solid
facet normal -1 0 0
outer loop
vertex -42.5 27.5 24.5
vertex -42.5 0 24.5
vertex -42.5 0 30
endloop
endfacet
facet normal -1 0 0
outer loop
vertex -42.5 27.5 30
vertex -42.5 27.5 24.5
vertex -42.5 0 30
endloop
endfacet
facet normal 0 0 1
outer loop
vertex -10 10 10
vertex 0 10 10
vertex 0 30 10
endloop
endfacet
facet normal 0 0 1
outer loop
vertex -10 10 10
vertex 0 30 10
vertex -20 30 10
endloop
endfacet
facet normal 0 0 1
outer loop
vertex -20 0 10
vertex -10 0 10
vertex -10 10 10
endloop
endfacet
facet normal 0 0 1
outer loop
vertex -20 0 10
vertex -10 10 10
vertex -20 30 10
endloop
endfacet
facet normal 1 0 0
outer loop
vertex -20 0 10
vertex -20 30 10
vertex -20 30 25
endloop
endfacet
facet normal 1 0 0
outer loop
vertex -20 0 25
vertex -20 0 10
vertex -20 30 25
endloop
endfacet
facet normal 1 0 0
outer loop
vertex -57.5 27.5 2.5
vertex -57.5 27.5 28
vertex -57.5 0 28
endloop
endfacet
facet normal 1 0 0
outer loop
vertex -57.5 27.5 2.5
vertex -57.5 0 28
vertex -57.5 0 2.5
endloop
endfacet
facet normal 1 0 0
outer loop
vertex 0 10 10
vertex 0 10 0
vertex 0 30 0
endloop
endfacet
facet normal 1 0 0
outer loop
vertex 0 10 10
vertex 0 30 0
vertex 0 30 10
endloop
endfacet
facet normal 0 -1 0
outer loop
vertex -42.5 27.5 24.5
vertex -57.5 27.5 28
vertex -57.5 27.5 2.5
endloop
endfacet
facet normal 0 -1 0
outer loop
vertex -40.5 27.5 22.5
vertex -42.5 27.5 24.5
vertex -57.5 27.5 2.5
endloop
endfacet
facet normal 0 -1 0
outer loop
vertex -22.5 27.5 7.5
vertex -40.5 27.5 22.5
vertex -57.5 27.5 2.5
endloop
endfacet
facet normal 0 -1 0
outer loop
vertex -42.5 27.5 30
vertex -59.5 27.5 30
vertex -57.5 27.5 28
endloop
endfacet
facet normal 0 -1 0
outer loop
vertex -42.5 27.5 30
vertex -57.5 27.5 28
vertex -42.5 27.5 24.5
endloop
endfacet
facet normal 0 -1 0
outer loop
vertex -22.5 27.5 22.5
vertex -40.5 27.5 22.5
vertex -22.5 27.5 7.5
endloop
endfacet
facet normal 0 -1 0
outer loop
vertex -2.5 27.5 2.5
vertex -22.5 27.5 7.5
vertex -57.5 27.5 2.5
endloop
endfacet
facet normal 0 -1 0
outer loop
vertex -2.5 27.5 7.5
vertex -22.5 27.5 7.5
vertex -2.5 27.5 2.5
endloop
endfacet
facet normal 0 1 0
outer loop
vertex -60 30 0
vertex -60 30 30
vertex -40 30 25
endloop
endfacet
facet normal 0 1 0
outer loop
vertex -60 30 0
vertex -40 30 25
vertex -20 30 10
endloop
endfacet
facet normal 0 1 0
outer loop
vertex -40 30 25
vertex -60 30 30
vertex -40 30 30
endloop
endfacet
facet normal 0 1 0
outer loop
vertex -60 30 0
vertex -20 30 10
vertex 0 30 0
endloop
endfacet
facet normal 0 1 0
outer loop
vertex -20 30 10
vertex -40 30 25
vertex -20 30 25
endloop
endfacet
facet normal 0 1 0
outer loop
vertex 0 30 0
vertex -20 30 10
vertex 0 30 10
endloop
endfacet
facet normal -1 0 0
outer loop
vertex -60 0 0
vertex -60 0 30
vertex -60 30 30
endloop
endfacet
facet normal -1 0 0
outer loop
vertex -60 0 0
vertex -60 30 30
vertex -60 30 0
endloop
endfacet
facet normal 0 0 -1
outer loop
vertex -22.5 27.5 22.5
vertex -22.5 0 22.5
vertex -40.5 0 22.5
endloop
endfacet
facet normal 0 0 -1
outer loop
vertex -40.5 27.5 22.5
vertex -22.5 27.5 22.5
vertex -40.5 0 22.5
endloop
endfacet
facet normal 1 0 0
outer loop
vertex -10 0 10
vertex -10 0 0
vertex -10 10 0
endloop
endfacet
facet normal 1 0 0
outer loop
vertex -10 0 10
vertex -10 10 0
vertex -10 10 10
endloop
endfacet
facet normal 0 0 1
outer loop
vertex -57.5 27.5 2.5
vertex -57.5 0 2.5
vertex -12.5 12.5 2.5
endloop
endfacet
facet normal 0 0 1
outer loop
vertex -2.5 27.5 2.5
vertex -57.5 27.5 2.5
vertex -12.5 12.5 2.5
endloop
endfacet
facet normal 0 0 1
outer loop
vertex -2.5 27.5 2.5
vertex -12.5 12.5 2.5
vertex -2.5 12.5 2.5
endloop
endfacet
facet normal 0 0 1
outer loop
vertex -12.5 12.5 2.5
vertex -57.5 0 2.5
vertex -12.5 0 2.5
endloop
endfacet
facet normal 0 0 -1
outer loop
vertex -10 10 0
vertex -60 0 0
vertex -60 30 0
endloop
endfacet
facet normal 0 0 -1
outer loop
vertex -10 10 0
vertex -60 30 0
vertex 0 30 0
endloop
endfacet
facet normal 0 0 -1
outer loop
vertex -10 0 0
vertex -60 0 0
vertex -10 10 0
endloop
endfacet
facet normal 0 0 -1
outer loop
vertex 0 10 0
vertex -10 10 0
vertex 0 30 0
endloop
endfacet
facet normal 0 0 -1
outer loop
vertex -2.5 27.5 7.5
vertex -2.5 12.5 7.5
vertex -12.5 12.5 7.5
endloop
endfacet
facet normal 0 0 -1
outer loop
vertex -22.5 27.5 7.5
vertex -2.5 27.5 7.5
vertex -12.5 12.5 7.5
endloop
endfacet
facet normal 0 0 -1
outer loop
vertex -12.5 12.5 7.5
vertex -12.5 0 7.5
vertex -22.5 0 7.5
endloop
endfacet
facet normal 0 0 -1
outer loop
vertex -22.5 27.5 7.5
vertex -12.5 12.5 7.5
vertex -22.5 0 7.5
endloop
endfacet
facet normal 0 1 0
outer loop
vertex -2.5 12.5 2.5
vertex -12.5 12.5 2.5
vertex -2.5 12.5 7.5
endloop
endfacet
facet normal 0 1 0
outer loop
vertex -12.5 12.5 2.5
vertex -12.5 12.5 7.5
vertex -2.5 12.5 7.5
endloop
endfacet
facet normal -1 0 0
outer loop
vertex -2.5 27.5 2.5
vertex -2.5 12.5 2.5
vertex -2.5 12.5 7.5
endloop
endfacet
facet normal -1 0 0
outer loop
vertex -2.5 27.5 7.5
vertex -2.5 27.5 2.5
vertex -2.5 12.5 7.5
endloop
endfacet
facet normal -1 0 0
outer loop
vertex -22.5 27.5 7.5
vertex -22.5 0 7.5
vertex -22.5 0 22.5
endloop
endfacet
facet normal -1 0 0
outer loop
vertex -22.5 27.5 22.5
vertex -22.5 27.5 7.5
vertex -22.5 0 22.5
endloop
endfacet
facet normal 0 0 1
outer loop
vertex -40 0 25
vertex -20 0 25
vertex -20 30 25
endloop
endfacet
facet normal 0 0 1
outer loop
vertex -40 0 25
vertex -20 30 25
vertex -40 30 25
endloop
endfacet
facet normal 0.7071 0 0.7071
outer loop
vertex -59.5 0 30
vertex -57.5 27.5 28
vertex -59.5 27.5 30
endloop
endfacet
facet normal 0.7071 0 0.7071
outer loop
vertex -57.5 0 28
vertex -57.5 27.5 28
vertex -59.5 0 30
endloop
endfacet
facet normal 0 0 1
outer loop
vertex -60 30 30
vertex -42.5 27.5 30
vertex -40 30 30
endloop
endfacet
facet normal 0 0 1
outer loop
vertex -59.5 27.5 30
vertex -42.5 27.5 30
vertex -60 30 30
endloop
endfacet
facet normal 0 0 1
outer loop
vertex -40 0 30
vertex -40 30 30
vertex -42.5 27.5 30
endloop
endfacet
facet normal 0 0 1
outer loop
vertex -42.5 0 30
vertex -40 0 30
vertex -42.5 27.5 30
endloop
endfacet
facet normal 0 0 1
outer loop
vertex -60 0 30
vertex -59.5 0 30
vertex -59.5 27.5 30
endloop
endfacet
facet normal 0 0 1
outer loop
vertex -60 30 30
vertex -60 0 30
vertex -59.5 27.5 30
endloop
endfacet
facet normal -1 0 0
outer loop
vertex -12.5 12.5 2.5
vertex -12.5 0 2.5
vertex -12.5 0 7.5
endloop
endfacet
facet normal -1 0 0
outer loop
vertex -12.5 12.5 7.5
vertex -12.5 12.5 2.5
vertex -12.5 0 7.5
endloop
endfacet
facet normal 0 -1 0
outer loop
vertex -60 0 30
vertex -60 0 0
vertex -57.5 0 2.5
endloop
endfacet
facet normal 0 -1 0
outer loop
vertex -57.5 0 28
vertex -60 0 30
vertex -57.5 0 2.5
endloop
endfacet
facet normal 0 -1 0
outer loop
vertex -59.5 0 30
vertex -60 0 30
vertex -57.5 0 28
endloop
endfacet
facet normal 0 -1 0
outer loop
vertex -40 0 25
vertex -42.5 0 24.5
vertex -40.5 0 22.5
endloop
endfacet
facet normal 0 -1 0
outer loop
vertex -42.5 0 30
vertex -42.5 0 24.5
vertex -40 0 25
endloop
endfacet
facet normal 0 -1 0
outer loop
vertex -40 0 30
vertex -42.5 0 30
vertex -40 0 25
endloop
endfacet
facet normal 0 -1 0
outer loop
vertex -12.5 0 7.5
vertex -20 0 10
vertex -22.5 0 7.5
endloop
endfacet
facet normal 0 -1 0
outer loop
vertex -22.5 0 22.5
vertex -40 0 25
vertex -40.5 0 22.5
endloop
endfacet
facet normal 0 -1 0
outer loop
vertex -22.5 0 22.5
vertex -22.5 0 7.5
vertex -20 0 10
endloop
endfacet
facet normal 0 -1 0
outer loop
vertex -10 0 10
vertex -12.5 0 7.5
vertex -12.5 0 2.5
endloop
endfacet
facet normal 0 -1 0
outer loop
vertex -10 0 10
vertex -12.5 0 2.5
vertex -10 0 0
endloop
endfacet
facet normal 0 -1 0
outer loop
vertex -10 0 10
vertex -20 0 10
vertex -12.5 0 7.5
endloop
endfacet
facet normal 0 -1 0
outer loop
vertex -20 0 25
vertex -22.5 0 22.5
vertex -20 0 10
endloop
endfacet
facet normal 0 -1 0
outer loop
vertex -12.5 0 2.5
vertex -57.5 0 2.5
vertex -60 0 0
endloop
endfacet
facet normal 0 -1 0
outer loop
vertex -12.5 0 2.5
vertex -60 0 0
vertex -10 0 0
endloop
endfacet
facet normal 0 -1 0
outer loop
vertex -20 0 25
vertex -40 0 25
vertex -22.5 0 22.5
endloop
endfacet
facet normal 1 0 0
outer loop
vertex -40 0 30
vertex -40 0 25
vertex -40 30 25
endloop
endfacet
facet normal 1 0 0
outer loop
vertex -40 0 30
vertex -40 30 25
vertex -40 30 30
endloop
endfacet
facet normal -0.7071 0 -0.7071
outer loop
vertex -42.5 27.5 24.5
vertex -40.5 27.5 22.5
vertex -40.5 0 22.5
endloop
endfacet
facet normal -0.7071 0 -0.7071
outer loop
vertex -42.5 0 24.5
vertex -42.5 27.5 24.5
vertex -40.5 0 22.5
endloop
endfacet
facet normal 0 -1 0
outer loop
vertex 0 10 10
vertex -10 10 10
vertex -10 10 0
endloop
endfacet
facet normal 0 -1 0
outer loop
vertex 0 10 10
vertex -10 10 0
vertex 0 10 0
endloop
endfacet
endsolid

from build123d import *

# Parameters (mm, degrees)
F1_DEPTH = 30
F2_W     = 10
F2_H     = 10
F3_DEPTH = 10
F4_T     = -2.5
F5_SIZE  = 2
F6_SIZE  = 2


with BuildPart() as f1:
    # F0 (on Front) → F1 (new body)
    with BuildSketch(Plane.XZ):
        Polygon((-60, 0), (0, 0), (0, 10), (-20, 10), (-20, 25), (-40, 25), (-40, 30), (-60, 30), align=None)
    extrude(amount=-F1_DEPTH)

    # F2 (on face) → F3 (cut)
    with BuildSketch(Plane.XZ):
        with Locations((-5, 5)):
            Rectangle(F2_W, F2_H)
    extrude(amount=-F3_DEPTH, mode=Mode.SUBTRACT)

    # F4
    f4_openings = [f1.faces().sort_by_distance(p)[0] for p in [
        (-50, 15, 30),
        (-38.75, 0, 13.125),
    ]]
    offset(amount=F4_T, openings=f4_openings, kind=Kind.INTERSECTION)

    # F5
    f5_edges = [f1.edges().sort_by_distance(p)[0] for p in [
        (-57.5, 13.75, 30),
    ]]
    chamfer(f5_edges, length=F5_SIZE)

    # F6
    f6_edges = [f1.edges().sort_by_distance(p)[0] for p in [
        (-42.5, 13.75, 22.5),
    ]]
    chamfer(f6_edges, length=F6_SIZE)


solid = f1.part
